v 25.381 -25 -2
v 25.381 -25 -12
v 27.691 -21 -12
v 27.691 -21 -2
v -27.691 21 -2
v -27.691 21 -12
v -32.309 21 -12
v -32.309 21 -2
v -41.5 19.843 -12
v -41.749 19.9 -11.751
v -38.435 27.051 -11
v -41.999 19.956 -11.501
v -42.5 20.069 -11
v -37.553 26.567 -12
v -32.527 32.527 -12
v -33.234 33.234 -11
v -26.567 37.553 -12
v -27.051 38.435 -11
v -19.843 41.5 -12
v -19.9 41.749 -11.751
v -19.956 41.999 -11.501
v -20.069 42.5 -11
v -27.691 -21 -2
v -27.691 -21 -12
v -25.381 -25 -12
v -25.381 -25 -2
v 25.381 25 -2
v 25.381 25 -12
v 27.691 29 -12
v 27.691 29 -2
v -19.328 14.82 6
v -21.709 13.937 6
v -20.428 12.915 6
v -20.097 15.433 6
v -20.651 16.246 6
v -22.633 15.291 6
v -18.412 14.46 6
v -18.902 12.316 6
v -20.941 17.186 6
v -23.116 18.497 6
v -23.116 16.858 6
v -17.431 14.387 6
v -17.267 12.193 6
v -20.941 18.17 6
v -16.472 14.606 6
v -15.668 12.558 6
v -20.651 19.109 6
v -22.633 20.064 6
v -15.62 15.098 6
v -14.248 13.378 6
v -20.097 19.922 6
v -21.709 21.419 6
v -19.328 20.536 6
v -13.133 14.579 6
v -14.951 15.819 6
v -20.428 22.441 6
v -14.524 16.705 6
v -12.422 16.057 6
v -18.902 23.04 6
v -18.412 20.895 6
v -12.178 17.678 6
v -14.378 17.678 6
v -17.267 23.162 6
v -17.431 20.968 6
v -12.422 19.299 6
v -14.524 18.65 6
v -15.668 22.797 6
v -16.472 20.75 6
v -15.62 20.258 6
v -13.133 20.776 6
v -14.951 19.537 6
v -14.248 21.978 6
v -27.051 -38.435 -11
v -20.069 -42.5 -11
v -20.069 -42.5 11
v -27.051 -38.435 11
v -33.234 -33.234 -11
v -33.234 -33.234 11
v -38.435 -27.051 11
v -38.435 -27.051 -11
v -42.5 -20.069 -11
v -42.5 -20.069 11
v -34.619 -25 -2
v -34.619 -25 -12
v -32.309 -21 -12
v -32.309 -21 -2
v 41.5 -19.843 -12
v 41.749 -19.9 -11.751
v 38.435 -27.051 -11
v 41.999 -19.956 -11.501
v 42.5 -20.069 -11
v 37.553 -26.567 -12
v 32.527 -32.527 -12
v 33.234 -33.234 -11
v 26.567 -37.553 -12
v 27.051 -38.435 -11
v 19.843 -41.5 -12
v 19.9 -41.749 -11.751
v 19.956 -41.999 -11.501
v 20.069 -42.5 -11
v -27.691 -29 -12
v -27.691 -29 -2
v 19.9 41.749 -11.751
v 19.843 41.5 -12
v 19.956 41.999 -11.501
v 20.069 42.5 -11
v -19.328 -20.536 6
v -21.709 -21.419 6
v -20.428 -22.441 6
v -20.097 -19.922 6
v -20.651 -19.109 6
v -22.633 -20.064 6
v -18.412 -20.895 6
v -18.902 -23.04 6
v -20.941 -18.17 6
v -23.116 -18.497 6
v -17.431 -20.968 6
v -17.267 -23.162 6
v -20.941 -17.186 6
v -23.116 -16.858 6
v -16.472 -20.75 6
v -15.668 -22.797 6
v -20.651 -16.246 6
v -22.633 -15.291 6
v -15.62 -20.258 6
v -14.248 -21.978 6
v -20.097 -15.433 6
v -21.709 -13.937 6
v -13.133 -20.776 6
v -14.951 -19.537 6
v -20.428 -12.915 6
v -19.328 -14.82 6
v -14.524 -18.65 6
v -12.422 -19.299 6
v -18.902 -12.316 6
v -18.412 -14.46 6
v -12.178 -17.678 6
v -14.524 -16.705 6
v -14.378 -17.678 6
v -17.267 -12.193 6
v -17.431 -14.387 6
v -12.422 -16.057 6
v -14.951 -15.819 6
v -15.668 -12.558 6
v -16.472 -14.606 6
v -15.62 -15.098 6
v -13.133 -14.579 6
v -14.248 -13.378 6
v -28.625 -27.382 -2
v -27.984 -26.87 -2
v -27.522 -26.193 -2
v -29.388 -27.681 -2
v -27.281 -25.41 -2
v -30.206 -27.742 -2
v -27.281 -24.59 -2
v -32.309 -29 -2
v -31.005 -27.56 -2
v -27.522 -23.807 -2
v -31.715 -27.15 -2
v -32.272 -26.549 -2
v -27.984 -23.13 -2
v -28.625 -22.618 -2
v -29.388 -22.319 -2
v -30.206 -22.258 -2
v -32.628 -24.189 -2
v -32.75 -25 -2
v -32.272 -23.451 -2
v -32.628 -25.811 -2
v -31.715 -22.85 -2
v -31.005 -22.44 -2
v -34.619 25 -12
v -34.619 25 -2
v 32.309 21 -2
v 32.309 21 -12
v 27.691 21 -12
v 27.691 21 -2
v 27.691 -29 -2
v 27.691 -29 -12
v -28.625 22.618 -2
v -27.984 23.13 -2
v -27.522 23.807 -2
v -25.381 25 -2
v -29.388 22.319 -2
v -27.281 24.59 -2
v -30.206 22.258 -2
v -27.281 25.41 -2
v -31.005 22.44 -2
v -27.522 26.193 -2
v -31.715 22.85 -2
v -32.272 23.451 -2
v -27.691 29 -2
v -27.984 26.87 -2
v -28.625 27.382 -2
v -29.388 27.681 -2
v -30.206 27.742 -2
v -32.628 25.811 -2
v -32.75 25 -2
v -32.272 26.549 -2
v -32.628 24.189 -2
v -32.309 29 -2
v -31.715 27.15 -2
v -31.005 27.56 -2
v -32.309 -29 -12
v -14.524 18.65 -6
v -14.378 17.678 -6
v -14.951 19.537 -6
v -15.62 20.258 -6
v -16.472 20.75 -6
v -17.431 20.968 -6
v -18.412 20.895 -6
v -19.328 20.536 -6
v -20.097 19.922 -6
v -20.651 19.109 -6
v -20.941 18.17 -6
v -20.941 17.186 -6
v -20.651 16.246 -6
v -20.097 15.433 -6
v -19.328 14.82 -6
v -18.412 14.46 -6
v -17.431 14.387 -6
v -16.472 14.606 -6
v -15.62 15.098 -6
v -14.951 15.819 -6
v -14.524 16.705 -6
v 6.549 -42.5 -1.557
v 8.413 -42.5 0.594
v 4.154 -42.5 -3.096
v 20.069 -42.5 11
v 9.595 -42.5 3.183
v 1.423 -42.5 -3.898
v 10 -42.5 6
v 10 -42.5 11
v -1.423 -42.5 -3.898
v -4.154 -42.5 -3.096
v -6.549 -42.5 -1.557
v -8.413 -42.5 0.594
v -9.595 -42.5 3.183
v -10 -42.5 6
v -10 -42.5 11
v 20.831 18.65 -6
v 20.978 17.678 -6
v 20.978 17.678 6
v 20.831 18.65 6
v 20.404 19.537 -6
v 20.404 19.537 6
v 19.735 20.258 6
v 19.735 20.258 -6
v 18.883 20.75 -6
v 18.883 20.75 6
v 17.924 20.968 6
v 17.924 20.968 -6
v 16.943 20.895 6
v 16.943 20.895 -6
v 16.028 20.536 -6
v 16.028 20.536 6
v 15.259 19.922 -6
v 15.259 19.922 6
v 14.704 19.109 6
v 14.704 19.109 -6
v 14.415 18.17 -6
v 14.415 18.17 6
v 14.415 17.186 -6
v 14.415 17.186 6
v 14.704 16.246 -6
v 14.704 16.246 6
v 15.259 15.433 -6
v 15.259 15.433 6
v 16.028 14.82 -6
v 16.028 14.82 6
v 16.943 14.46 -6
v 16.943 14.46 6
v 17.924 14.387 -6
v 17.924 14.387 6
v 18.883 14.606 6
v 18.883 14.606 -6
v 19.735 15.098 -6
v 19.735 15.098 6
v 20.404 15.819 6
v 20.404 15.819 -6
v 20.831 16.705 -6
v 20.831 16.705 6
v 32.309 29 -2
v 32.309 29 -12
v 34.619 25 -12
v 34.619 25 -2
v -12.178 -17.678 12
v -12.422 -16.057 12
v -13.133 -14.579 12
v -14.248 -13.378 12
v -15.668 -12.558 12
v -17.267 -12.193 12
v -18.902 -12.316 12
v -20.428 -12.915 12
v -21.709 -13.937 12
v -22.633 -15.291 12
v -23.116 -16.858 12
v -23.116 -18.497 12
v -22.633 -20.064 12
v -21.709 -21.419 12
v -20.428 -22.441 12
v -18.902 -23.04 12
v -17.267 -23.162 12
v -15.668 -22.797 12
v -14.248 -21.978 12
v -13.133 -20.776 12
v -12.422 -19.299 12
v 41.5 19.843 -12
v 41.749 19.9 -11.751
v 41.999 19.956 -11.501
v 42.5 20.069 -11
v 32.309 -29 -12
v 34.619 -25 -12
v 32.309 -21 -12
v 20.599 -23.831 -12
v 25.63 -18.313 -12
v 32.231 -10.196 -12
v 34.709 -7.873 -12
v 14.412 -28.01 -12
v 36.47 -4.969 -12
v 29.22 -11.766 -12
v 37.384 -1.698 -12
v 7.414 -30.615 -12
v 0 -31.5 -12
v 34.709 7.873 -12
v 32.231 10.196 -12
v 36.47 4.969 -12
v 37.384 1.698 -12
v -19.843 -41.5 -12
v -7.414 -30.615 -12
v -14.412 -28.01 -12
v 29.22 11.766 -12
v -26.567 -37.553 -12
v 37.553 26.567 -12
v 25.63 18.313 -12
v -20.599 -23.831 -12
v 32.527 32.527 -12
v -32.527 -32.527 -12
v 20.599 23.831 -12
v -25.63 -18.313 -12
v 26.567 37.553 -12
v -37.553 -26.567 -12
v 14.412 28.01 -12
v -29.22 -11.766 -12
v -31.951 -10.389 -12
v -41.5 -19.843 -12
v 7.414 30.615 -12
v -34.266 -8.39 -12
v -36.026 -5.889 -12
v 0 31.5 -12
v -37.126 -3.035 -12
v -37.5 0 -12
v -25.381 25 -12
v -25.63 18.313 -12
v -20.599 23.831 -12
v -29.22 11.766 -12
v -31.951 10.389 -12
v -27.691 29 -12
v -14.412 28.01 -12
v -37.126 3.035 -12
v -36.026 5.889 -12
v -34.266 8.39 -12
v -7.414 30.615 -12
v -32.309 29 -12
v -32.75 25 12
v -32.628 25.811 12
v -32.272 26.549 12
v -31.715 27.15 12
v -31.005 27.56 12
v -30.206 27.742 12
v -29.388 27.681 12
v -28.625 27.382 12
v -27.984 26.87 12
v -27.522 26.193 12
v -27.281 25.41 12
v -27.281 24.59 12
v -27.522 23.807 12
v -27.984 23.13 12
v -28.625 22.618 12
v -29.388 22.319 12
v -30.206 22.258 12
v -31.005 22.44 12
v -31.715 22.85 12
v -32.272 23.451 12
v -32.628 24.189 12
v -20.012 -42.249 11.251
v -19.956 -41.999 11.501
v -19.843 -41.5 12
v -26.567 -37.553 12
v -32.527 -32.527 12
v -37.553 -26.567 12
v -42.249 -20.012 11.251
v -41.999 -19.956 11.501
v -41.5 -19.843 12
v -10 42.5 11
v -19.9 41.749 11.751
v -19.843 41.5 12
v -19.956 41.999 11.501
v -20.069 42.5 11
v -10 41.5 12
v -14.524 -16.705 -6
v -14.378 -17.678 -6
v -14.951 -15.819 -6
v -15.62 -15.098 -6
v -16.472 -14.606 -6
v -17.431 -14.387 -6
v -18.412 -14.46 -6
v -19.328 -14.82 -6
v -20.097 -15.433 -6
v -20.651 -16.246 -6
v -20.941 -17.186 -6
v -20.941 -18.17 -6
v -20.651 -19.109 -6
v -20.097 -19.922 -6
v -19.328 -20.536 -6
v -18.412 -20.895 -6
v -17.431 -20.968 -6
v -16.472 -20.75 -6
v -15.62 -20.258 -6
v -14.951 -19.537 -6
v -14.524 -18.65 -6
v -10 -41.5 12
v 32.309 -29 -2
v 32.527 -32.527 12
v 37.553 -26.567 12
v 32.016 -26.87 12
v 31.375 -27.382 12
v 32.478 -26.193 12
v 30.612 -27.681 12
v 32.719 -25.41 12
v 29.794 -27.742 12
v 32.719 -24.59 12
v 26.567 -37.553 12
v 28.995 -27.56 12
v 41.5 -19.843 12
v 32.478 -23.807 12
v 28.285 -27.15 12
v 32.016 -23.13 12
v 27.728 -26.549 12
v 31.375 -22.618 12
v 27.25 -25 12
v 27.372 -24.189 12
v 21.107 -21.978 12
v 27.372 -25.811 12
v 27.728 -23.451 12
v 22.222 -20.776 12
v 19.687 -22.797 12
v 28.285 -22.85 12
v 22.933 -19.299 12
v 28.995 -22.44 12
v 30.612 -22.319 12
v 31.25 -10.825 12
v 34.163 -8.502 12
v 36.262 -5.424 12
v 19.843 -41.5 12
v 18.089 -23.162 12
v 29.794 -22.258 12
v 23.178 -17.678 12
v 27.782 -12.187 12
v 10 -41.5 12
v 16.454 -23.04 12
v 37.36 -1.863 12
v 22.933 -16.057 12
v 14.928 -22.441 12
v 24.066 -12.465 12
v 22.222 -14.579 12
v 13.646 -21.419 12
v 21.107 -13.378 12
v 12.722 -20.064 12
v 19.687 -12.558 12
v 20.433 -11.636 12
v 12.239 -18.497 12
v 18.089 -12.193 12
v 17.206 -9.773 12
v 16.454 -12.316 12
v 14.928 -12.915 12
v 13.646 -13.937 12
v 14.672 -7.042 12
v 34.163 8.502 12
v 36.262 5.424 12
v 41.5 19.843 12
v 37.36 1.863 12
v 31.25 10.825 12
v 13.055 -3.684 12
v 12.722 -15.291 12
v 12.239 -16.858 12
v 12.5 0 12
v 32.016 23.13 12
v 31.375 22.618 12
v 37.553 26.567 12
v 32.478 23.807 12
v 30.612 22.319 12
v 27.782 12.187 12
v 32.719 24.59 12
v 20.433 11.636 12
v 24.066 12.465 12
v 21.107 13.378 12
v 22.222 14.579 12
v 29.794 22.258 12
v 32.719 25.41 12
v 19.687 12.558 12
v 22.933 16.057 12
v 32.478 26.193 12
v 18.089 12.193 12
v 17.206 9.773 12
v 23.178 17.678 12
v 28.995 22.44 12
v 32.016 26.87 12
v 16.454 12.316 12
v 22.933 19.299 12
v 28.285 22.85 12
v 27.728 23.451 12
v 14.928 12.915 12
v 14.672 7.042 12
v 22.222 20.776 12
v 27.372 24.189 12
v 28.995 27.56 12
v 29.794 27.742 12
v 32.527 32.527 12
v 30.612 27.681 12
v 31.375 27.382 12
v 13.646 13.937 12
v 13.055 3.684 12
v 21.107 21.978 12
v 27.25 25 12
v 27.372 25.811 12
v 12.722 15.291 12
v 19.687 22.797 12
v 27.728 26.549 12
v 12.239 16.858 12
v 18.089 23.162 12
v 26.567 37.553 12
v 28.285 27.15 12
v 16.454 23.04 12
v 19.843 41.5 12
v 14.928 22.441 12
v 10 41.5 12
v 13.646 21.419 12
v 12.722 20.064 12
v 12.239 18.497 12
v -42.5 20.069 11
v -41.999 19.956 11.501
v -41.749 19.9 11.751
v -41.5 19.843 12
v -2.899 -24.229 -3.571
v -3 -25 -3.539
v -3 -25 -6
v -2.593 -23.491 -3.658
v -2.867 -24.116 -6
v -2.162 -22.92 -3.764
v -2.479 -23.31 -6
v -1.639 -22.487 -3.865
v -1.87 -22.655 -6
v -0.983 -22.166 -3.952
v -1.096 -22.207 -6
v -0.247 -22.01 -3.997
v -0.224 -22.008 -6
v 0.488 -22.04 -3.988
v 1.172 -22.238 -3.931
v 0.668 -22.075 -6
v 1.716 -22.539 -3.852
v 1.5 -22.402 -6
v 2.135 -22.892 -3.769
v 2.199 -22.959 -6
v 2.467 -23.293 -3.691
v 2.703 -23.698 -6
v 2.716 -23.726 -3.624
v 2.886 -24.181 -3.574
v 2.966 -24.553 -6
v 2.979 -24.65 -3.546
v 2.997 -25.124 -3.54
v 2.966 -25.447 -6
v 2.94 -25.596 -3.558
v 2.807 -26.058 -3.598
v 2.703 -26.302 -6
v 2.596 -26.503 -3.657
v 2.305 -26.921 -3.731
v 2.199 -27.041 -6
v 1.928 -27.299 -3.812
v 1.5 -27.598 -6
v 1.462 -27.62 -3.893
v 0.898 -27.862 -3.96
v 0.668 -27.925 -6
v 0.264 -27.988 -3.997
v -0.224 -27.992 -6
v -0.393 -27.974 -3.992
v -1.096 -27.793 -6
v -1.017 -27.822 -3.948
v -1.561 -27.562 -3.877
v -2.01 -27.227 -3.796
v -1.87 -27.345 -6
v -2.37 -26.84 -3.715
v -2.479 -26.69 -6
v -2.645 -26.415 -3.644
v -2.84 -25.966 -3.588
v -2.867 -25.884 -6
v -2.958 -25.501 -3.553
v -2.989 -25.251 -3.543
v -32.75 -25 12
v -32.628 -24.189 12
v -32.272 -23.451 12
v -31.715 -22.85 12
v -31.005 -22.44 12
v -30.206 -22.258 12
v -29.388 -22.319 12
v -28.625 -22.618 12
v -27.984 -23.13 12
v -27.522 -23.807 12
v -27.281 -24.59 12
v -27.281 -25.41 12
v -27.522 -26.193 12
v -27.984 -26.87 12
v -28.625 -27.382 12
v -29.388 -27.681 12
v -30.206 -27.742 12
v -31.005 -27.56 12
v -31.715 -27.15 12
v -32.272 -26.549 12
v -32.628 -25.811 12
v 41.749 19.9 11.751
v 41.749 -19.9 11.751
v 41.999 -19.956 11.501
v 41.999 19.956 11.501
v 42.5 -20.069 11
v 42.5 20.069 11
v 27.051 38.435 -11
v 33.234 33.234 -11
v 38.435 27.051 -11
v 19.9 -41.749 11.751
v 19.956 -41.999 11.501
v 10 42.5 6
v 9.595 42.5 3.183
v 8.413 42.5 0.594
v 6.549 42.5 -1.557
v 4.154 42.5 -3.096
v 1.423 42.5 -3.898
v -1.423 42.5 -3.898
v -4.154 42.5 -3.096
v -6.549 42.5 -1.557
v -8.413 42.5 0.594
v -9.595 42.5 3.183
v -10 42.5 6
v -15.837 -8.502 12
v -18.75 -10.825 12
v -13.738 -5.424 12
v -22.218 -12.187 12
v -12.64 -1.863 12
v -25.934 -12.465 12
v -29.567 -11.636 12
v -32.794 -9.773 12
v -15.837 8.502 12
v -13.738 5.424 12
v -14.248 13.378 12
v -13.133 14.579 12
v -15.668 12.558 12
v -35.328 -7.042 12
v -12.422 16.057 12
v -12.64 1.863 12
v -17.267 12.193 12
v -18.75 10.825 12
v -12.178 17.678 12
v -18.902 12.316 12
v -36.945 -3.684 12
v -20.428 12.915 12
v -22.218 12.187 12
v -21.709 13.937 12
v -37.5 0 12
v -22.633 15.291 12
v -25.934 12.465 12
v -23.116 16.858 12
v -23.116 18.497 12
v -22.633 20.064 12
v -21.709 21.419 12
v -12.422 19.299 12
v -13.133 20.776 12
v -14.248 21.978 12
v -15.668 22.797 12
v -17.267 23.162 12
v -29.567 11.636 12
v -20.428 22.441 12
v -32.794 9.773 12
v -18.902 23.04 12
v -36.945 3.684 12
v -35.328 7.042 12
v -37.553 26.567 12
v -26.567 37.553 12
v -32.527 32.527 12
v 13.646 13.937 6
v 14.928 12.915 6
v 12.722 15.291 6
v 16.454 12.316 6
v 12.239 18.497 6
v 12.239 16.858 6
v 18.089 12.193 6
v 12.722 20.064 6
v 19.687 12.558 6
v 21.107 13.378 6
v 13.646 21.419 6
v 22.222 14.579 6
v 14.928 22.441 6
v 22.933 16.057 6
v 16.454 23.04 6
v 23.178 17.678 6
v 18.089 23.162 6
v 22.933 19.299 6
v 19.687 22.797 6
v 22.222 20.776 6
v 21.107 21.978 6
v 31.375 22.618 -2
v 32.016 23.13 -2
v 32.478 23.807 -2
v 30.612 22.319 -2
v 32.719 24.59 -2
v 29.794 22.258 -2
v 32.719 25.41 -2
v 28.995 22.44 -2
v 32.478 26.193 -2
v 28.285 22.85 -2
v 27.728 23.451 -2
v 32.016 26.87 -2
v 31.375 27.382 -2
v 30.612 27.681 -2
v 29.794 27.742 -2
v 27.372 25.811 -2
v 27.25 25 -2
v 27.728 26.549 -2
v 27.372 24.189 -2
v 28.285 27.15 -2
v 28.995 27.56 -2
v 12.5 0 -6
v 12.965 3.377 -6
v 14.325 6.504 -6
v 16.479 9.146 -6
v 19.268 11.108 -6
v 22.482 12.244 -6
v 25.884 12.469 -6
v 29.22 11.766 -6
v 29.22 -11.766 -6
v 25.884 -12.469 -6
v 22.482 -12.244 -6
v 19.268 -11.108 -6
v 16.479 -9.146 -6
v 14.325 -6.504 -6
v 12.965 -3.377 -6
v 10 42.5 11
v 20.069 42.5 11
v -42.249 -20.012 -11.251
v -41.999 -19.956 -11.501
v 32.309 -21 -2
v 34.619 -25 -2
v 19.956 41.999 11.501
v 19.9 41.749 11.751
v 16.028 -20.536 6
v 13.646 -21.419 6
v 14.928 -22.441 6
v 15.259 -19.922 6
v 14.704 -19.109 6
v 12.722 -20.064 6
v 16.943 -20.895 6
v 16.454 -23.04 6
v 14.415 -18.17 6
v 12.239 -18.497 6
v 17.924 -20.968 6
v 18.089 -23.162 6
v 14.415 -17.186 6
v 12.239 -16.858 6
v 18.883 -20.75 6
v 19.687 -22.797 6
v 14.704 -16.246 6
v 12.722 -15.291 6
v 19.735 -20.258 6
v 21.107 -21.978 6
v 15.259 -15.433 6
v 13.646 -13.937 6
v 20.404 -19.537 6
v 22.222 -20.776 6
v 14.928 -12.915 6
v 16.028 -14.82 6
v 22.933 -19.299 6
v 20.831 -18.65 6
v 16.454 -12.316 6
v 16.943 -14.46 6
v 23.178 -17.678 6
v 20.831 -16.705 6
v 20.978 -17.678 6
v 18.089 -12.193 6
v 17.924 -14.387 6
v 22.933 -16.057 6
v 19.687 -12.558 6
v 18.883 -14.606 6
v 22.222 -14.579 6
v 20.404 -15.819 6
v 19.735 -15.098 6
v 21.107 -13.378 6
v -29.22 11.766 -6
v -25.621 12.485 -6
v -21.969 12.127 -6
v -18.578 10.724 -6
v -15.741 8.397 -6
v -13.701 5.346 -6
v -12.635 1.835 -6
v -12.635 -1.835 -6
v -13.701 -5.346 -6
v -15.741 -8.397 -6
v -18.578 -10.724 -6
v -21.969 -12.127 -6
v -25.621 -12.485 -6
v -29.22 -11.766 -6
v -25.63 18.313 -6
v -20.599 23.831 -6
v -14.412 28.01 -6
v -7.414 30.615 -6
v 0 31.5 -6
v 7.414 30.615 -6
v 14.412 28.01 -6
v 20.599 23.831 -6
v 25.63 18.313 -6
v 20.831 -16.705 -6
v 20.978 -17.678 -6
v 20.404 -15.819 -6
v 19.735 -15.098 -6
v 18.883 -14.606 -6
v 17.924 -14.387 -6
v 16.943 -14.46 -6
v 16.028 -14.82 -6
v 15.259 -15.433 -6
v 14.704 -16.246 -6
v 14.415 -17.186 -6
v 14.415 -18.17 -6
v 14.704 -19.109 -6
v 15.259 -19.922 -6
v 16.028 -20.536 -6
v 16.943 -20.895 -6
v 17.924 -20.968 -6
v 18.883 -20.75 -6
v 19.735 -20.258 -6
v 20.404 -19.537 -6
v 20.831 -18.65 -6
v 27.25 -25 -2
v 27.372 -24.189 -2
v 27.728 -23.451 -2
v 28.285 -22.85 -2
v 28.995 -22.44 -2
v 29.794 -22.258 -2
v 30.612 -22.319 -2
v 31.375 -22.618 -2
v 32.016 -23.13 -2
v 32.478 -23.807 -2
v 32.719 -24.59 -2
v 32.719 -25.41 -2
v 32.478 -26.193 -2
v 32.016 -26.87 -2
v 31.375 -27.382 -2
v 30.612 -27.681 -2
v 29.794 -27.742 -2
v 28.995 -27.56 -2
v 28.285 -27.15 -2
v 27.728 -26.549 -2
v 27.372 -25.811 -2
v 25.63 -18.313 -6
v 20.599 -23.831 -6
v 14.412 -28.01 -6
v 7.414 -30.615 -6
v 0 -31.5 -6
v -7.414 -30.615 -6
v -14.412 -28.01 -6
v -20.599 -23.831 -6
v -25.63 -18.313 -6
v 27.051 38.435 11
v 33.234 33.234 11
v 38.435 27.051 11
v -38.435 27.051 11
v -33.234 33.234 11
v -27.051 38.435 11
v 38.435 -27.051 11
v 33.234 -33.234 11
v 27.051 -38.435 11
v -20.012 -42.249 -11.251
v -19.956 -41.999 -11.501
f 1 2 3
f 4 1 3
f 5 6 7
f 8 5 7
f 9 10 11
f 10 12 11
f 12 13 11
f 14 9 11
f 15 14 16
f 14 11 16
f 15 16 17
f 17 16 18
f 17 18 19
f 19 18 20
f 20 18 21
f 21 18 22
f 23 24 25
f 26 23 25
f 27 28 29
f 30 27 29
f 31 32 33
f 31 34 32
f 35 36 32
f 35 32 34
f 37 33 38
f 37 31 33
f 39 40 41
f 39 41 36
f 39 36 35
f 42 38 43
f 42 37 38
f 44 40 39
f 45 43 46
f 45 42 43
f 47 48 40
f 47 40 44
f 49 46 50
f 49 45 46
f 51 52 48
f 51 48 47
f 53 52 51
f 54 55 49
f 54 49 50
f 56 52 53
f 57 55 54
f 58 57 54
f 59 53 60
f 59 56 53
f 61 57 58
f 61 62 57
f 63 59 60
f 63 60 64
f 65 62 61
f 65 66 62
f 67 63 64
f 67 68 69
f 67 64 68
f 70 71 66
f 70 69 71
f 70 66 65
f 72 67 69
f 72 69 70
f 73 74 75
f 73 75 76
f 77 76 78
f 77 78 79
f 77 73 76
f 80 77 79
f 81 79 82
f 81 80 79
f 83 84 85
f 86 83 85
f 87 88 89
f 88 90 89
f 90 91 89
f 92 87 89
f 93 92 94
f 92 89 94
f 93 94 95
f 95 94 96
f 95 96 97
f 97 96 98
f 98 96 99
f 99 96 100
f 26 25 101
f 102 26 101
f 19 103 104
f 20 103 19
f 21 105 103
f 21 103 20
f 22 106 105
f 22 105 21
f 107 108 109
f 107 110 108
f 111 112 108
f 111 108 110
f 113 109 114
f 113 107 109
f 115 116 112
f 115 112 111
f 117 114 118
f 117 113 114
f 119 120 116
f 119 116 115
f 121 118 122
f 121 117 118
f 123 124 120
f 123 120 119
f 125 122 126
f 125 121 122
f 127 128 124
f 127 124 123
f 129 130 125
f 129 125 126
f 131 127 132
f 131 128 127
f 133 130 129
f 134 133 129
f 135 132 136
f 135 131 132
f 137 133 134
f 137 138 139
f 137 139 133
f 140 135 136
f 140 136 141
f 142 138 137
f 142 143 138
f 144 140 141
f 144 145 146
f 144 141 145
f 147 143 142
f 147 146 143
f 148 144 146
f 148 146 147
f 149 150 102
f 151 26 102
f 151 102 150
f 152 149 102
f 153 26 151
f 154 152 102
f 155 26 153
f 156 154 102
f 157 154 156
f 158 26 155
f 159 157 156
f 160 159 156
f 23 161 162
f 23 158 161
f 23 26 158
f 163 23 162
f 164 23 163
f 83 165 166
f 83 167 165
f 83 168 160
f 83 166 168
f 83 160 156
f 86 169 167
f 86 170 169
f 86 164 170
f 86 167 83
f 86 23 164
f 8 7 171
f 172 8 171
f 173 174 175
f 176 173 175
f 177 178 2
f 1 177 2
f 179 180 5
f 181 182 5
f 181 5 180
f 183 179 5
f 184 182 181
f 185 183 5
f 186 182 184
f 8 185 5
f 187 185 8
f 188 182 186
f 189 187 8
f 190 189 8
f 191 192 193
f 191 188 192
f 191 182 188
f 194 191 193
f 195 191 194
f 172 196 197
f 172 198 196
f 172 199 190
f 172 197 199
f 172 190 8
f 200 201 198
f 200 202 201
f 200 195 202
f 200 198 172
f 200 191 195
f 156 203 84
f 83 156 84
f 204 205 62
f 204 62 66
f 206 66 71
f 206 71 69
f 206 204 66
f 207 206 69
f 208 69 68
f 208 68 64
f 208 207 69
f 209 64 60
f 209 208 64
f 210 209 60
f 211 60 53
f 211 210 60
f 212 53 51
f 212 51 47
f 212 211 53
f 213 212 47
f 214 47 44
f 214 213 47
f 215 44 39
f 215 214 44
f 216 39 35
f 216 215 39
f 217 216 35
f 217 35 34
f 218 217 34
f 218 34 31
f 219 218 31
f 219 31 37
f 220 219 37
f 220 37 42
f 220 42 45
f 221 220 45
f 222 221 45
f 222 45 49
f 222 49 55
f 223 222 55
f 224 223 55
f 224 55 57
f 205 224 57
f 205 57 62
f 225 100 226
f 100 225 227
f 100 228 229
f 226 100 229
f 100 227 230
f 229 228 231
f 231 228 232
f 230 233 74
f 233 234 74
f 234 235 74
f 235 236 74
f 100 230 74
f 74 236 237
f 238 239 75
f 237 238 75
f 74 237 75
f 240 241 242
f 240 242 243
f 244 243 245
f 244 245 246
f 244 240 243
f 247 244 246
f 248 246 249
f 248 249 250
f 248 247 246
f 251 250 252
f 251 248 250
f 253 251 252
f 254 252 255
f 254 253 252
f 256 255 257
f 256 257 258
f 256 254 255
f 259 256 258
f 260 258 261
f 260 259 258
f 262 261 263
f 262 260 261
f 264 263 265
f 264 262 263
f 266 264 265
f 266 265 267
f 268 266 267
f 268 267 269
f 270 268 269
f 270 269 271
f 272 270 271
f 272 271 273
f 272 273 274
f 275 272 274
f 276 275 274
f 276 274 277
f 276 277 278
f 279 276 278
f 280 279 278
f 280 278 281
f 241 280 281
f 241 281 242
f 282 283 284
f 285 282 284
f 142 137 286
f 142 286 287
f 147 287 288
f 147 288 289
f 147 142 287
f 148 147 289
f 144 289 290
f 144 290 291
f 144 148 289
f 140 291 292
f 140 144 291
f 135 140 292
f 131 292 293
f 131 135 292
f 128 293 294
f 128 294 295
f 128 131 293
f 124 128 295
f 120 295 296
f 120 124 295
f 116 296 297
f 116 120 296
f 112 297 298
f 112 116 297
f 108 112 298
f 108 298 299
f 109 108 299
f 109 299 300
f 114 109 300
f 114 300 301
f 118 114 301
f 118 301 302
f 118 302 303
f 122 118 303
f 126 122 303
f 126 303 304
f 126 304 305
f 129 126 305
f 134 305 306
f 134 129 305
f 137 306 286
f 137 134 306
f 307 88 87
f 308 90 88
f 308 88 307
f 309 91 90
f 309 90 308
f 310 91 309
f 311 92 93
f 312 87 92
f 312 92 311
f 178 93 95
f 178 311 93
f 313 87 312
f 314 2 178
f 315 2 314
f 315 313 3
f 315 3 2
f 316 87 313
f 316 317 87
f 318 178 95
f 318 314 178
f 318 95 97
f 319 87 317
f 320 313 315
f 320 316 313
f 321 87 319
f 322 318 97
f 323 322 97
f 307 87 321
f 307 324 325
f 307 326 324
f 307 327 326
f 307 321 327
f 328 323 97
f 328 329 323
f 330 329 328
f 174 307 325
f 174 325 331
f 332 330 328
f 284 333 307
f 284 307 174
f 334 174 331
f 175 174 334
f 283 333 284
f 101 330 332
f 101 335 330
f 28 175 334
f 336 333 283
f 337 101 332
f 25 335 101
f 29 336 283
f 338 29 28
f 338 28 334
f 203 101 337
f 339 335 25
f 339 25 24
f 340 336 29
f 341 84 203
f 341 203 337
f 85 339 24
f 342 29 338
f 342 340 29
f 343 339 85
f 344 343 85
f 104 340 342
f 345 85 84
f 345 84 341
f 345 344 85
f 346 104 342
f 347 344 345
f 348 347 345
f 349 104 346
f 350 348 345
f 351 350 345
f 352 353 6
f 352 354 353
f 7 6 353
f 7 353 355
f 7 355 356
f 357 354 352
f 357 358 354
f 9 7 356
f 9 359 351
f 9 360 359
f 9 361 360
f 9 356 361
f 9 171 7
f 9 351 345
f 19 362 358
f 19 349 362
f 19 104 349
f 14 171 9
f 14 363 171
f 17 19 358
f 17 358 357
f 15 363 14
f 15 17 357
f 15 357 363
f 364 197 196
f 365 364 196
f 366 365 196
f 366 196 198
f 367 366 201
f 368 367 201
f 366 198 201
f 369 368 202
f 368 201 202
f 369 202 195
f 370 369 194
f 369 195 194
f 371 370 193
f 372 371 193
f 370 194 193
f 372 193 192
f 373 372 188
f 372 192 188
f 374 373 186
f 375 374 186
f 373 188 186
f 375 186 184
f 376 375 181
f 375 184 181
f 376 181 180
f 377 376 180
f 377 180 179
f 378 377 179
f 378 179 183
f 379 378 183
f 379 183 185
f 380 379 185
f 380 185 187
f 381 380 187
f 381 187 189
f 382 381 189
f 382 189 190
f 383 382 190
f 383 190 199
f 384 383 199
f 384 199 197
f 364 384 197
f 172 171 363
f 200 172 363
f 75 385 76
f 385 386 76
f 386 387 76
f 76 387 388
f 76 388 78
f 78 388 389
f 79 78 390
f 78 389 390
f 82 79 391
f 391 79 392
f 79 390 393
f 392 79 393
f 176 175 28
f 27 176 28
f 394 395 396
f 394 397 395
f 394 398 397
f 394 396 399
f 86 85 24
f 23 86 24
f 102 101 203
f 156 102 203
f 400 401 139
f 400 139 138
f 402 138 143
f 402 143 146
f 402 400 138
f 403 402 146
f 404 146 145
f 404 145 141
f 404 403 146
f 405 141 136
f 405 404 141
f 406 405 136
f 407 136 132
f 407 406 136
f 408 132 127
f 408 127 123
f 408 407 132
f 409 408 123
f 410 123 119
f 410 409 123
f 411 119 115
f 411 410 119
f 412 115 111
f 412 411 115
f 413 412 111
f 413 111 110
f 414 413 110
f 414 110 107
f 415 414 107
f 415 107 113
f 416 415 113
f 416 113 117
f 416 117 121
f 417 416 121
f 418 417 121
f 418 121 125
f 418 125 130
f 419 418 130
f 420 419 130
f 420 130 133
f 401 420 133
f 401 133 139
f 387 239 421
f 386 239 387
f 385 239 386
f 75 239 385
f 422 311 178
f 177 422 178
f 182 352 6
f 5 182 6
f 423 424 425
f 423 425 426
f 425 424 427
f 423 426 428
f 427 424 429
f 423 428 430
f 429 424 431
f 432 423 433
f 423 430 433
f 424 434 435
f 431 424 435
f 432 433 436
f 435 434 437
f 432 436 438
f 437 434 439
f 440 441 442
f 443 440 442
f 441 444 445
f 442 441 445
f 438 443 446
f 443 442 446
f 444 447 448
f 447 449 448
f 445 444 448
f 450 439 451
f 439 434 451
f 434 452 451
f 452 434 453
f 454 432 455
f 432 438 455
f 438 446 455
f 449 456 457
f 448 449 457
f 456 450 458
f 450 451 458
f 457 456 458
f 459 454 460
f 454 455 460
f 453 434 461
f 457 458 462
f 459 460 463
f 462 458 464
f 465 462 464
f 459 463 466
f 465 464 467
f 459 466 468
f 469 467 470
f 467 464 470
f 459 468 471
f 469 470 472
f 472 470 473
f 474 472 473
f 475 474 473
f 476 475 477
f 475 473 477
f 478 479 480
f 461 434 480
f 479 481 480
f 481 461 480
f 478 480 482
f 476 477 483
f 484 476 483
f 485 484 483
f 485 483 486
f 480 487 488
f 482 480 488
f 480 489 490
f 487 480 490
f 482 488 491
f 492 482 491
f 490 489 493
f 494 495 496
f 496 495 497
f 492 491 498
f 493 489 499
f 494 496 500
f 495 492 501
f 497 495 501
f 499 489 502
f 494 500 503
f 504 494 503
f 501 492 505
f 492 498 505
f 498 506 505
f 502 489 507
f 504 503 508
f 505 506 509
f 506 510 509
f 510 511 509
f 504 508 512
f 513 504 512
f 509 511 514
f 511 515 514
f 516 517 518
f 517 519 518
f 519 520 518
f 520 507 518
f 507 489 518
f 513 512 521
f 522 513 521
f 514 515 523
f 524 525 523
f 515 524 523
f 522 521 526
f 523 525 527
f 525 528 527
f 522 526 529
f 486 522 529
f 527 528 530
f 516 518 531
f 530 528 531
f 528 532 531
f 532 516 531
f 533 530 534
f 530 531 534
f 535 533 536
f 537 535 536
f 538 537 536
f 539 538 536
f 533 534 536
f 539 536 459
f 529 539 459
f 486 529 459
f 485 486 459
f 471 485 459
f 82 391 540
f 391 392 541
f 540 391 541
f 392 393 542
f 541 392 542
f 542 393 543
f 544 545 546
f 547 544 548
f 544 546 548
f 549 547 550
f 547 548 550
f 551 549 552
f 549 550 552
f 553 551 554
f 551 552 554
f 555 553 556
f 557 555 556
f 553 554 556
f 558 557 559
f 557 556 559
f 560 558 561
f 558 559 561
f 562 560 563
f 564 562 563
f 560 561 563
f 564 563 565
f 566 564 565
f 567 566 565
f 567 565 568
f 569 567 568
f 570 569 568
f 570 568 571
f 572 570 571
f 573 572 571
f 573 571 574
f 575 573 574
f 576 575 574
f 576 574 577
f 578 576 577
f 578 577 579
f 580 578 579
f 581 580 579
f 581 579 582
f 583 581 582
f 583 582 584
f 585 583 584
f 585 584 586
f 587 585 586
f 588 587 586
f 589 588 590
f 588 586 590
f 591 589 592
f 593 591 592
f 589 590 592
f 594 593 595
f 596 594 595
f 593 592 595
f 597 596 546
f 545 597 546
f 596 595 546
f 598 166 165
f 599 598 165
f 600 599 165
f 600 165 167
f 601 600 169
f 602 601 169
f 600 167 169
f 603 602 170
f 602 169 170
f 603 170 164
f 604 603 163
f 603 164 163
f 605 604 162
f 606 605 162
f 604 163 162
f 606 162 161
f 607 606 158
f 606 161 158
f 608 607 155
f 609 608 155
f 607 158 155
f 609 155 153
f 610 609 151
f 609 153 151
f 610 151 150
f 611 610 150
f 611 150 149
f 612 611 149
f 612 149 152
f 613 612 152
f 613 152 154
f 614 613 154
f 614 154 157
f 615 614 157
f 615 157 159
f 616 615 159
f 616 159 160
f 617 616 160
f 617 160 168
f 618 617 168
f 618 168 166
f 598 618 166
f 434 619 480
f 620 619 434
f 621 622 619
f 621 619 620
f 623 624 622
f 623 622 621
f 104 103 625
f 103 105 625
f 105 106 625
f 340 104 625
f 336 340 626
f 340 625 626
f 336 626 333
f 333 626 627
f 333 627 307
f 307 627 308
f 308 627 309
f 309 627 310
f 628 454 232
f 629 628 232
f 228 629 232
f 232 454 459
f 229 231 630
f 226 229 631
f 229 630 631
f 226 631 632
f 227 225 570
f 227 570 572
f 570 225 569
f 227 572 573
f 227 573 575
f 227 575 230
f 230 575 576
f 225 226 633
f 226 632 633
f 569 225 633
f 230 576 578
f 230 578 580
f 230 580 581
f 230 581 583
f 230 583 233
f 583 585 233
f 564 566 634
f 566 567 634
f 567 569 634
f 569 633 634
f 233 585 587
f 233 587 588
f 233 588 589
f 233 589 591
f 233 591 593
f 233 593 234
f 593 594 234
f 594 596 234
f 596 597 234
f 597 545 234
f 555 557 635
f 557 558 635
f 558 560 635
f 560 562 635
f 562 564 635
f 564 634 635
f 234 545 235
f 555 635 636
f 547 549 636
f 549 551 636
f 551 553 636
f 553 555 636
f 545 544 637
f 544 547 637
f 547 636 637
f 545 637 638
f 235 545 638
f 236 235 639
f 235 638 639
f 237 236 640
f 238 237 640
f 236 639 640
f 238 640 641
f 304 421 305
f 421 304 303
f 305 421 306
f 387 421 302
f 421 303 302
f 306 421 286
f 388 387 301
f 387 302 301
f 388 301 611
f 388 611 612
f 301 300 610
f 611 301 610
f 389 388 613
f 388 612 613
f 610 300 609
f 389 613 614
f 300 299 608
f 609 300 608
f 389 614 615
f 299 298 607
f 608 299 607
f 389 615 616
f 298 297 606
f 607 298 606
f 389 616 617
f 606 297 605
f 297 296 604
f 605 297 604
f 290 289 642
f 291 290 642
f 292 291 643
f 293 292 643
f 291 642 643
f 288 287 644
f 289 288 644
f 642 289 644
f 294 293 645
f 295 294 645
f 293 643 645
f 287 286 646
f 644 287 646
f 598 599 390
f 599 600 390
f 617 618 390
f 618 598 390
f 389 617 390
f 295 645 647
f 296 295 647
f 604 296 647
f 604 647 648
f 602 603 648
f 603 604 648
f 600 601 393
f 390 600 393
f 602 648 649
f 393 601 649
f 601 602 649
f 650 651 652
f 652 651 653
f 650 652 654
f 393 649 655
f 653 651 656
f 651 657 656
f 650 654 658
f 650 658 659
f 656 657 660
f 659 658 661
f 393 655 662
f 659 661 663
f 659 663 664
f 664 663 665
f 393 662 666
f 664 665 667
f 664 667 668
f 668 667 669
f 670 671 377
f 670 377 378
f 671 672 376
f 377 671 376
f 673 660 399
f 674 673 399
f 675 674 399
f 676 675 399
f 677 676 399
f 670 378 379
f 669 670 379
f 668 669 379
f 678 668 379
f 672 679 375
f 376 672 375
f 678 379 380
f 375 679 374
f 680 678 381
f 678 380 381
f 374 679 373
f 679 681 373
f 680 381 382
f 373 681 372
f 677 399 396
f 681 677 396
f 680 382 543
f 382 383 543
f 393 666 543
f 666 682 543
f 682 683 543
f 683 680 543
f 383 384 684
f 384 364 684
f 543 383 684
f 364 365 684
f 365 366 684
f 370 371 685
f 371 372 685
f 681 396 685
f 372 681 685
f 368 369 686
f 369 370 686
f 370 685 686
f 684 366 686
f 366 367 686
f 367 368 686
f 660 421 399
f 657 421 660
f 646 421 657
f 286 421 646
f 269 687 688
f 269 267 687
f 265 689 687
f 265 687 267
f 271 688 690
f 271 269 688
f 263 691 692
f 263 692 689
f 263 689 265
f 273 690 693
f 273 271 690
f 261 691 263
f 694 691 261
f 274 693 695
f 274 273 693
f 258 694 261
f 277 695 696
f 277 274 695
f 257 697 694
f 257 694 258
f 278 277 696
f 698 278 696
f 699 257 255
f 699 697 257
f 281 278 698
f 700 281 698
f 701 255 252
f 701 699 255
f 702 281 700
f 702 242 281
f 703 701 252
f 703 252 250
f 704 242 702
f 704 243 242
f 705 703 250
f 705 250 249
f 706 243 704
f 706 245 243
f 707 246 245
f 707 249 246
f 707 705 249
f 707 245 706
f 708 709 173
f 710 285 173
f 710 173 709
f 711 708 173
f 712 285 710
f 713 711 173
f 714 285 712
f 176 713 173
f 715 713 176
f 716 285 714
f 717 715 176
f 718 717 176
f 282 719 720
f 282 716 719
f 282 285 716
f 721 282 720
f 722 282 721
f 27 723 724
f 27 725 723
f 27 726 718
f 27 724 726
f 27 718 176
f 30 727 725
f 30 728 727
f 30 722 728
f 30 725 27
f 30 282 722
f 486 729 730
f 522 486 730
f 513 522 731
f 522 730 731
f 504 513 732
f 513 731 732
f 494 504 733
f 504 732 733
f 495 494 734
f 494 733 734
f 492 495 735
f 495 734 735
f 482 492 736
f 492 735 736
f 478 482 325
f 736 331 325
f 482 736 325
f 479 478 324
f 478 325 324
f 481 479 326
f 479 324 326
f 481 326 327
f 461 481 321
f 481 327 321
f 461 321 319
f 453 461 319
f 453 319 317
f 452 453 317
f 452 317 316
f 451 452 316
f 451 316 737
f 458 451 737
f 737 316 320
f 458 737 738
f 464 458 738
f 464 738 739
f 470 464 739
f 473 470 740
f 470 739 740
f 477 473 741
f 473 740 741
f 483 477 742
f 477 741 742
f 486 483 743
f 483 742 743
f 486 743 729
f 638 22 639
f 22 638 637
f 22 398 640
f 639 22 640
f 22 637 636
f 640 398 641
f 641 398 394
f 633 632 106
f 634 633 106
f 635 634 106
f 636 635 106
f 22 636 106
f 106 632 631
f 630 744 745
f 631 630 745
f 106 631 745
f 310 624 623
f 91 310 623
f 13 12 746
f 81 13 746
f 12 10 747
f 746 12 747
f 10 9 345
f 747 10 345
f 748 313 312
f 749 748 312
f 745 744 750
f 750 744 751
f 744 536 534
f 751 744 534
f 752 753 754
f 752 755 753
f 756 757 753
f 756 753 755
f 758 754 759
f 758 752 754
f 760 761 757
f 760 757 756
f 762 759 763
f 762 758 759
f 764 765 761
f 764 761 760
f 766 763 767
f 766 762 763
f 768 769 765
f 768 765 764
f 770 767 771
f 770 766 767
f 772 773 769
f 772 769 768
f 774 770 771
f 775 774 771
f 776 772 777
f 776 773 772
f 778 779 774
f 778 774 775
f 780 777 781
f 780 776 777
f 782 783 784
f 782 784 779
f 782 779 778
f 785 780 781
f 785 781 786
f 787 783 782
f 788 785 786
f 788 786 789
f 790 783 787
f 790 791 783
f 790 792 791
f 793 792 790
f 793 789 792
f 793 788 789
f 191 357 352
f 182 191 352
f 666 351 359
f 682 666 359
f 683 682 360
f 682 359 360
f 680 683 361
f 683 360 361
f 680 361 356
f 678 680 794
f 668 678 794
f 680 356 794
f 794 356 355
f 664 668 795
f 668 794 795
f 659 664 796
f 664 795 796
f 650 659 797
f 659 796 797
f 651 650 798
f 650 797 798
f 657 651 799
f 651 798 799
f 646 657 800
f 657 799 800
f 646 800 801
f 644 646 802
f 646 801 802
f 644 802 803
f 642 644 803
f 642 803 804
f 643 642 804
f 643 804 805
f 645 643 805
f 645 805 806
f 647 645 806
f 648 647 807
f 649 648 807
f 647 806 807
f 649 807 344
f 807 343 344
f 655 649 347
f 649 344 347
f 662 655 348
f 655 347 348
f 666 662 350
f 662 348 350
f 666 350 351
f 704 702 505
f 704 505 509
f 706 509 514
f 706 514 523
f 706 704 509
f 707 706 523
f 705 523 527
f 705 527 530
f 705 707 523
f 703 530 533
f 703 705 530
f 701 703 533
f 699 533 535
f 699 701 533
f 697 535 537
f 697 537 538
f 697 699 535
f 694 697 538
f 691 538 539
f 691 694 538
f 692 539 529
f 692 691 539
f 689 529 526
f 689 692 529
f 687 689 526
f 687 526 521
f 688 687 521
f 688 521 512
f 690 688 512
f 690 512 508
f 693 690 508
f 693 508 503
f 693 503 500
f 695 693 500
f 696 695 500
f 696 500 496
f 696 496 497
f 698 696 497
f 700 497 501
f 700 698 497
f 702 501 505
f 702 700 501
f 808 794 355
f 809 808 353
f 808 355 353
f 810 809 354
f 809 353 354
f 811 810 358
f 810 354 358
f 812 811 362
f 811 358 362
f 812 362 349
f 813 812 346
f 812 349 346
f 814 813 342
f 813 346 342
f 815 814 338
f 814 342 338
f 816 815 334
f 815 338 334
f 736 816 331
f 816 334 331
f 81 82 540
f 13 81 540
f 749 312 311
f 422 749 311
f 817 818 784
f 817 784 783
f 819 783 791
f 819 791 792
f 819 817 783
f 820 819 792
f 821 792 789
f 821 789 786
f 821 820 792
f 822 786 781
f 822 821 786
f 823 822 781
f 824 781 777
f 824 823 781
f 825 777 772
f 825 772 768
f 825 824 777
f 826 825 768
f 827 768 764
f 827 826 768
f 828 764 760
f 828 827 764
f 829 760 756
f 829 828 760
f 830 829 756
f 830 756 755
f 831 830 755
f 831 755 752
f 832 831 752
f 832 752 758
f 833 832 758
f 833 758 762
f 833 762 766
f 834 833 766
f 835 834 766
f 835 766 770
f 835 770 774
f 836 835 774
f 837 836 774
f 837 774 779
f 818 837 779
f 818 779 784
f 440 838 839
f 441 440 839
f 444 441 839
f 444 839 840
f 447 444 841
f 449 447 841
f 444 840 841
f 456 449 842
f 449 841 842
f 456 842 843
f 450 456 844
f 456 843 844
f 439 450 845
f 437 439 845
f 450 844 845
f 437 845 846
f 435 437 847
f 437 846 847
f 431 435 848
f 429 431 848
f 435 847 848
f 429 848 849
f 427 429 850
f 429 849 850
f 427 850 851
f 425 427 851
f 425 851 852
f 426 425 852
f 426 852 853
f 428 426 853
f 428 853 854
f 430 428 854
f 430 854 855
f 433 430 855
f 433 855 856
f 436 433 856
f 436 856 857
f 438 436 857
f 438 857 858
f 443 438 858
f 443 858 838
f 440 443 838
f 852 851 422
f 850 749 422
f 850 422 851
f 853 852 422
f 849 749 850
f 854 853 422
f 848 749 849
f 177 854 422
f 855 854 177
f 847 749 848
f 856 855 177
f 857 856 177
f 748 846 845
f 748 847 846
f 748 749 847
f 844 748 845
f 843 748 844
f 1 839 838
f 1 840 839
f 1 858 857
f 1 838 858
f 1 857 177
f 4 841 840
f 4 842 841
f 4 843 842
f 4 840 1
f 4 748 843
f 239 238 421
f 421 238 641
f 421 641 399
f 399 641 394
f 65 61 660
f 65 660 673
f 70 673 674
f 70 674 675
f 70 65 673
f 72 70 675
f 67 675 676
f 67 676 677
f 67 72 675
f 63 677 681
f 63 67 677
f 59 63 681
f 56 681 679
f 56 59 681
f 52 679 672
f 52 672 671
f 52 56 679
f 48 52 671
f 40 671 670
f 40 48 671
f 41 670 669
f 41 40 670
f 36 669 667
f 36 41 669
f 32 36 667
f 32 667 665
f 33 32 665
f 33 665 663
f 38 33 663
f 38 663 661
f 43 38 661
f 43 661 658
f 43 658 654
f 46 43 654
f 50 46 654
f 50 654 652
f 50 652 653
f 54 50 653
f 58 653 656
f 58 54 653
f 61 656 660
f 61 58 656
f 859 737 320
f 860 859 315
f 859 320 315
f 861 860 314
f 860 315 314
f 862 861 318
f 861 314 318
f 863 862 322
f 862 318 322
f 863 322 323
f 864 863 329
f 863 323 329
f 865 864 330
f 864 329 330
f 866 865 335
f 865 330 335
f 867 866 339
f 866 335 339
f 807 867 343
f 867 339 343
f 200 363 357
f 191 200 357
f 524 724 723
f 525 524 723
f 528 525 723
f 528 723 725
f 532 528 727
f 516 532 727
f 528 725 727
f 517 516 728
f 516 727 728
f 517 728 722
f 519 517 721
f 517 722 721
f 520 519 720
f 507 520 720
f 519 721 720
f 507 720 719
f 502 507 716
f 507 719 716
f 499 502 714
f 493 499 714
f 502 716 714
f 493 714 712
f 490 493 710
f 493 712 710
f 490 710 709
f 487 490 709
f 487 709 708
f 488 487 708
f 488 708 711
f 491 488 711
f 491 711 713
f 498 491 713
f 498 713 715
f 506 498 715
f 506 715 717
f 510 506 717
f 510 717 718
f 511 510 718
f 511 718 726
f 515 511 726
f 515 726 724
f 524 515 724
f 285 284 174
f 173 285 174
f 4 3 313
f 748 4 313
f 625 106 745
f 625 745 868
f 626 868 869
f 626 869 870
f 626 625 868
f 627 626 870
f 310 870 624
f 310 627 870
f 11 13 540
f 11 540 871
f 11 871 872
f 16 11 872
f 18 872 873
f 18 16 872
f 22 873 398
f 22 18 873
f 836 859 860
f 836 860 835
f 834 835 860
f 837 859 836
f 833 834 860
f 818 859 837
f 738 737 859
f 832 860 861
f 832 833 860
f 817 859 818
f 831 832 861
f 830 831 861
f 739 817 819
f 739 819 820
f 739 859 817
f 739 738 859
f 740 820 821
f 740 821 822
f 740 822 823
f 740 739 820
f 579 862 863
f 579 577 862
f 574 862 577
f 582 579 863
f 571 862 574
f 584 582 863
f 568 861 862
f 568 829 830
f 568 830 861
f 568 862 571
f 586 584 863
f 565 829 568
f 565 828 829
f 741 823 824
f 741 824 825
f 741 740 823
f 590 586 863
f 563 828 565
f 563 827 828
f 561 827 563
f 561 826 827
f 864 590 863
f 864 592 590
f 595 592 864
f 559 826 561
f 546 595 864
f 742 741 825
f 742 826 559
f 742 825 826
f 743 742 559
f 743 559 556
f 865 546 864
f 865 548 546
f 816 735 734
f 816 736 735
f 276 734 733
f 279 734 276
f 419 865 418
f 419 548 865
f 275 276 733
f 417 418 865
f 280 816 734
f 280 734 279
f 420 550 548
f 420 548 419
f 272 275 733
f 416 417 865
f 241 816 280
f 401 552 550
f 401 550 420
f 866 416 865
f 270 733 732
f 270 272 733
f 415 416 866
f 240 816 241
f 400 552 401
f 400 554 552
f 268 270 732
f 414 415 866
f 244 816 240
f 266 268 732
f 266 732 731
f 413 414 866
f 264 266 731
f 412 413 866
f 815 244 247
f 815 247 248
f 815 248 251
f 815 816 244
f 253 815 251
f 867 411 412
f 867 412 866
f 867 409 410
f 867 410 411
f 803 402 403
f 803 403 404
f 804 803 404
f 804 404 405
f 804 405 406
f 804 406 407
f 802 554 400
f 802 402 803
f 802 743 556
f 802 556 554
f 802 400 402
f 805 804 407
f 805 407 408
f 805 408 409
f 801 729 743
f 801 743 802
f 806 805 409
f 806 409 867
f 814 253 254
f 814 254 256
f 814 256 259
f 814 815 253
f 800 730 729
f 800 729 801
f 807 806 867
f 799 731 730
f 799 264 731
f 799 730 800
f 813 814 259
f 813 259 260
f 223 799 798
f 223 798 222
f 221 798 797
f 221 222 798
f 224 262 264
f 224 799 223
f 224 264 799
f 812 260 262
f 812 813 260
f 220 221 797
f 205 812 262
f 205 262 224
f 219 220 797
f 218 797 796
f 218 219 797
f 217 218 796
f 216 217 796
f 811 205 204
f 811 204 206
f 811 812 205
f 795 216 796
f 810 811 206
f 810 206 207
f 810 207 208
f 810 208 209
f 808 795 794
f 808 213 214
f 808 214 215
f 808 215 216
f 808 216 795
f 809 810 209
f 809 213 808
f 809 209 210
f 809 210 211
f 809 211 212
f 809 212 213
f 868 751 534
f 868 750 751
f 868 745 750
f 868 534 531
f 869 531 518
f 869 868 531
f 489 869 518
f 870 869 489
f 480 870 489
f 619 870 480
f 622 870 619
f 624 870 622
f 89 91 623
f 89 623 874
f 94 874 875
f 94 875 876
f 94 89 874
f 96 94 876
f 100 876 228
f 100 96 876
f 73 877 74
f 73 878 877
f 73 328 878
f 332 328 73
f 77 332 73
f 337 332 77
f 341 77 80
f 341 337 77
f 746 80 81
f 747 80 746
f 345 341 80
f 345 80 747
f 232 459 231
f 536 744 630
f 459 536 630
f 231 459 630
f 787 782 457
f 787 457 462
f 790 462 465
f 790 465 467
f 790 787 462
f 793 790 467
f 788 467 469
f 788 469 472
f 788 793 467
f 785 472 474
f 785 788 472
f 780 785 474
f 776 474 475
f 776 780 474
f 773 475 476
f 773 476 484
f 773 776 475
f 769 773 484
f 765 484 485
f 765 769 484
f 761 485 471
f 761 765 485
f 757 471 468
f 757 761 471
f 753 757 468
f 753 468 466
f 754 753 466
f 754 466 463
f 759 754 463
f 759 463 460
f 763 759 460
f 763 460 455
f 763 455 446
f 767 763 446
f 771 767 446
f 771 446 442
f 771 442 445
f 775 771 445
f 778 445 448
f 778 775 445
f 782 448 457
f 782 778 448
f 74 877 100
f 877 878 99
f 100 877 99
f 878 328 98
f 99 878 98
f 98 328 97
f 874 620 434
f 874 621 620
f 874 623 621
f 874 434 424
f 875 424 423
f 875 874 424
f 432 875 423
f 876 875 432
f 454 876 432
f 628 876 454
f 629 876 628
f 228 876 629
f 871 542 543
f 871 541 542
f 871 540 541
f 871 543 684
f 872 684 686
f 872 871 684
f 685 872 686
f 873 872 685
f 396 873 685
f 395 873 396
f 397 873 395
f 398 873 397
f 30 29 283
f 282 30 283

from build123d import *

# Parameters (mm, degrees)
SKETCH1_W                        = 70
SKETCH1_H                        = 50
BOSS_EXTRUDE1_DEPTH              = 12
SKETCH4_R                        = 47
BOSS_EXTRUDE2_DEPTH              = 24
SKETCH2_R                        = 31.5
CUT_EXTRUDE1_DEPTH               = 6
CBORE_START                      = -6
CBORE_FOR_M6_SHCS1_OUTLINE_R     = 3.3
CBORE_FOR_M6_SHCS1_DEPTH         = 18
CBORE_START_2                    = 6
CBORE_FOR_M6_SHCS1_2_OUTLINE_R   = 5.5
CBORE_FOR_M6_SHCS1_2_OUTLINE_R_2 = 3.3
CBORE_FOR_M6_SHCS1_2_DEPTH       = 6
CUT_EXTRUDE6_DEPTH               = 68.542579163
CUT_EXTRUDE6_DEPTH_BACK          = 68.542579163
M5_CLEARANCE_HOLE2_D             = 5.5
F_6_0MM_PRESS_DOWEL_HOLE2_D      = 6
SKETCH22_R                       = 12.5
CUT_EXTRUDE7_DEPTH               = 71.668239144
CUT_EXTRUDE8_DEPTH               = 10
CUT_EXTRUDE9_DEPTH               = 71.668239144
CHAMFER2_SIZE                    = 1


# Read off the part's stored shape, not the designer's step: CBORE for M6 SHCS1
with BuildPart() as part:
    # Sketch1 → Boss-Extrude1 (new, symmetric)
    with BuildSketch(Plane.XY):
        Rectangle(SKETCH1_W, SKETCH1_H)
    extrude(amount=BOSS_EXTRUDE1_DEPTH, both=True)

    # Sketch4 → Boss-Extrude2 (add, through all)
    with BuildSketch(Plane(origin=(0, 0, -12), x_dir=(-1, 0, 0), z_dir=(0, 0, -1))):
        Circle(SKETCH4_R)
    extrude(amount=-BOSS_EXTRUDE2_DEPTH)

    # Sketch2 → Cut-Extrude1 (cut)
    with BuildSketch(Plane(origin=(0, 0, -12), x_dir=(-1, 0, 0), z_dir=(0, 0, -1))):
        Circle(SKETCH2_R)
    extrude(amount=-CUT_EXTRUDE1_DEPTH, mode=Mode.SUBTRACT)

    # CBORE for M6 SHCS1 outline → CBORE for M6 SHCS1 (cut)
    with BuildSketch(Plane.XY.offset(CBORE_START)):
        with Locations((-17.67766953, -17.67766953)):
            Circle(CBORE_FOR_M6_SHCS1_OUTLINE_R)
        with Locations((-17.67766953, 17.67766953)):
            Circle(CBORE_FOR_M6_SHCS1_OUTLINE_R)
        with Locations((17.67766953, 17.67766953)):
            Circle(CBORE_FOR_M6_SHCS1_OUTLINE_R)
        with Locations((17.67766953, -17.67766953)):
            Circle(CBORE_FOR_M6_SHCS1_OUTLINE_R)
    extrude(amount=CBORE_FOR_M6_SHCS1_DEPTH, mode=Mode.SUBTRACT)

    # CBORE for M6 SHCS1 2 outline → CBORE for M6 SHCS1 2 (cut)
    # profile 1 of 4: a face of its own
    with BuildSketch(Plane.XY.offset(CBORE_START_2)):
        with Locations((-17.67766953, -17.67766953)):
            Circle(CBORE_FOR_M6_SHCS1_2_OUTLINE_R)
        with Locations((-17.67766953, -17.67766953)):
            Circle(CBORE_FOR_M6_SHCS1_2_OUTLINE_R_2, mode=Mode.SUBTRACT)
    # profile 2 of 4: a face of its own
    with BuildSketch(Plane.XY.offset(CBORE_START_2)):
        with Locations((-17.67766953, 17.67766953)):
            Circle(CBORE_FOR_M6_SHCS1_2_OUTLINE_R)
        with Locations((-17.67766953, 17.67766953)):
            Circle(CBORE_FOR_M6_SHCS1_2_OUTLINE_R_2, mode=Mode.SUBTRACT)
    # profile 3 of 4: a face of its own
    with BuildSketch(Plane.XY.offset(CBORE_START_2)):
        with Locations((17.67766953, 17.67766953)):
            Circle(CBORE_FOR_M6_SHCS1_2_OUTLINE_R)
        with Locations((17.67766953, 17.67766953)):
            Circle(CBORE_FOR_M6_SHCS1_2_OUTLINE_R_2, mode=Mode.SUBTRACT)
    # profile 4 of 4: a face of its own
    with BuildSketch(Plane.XY.offset(CBORE_START_2)):
        with Locations((17.67766953, -17.67766953)):
            Circle(CBORE_FOR_M6_SHCS1_2_OUTLINE_R)
        with Locations((17.67766953, -17.67766953)):
            Circle(CBORE_FOR_M6_SHCS1_2_OUTLINE_R_2, mode=Mode.SUBTRACT)
    extrude(amount=CBORE_FOR_M6_SHCS1_2_DEPTH, mode=Mode.SUBTRACT)

    # Sketch17 → Cut-Extrude6 (cut, two sides: drawn at the far end of the back side and taken through both)
    with BuildSketch(Plane.XZ.offset(-CUT_EXTRUDE6_DEPTH_BACK)):
        with BuildLine():
            Line((10, 16), (10, 6))
            ThreePointArc((10, 6), (0, -4), (-10, 6))
            Line((-10, 6), (-10, 16))
            ThreePointArc((-10, 16), (0, 26), (10, 16))
        make_face()
    extrude(amount=CUT_EXTRUDE6_DEPTH + CUT_EXTRUDE6_DEPTH_BACK, mode=Mode.SUBTRACT)

    # M5 Clearance Hole2 (through all)
    with Locations(Plane.XY.offset(12)):
        with Locations((-30, 25), (-30, -25), (30, -25), (30, 25)):
            Hole(M5_CLEARANCE_HOLE2_D / 2)

    # Ø6.0mm Press Dowel Hole2 (through all)
    with Locations(Plane.XY.offset(12)):
        with Locations((0, -25)):
            Hole(F_6_0MM_PRESS_DOWEL_HOLE2_D / 2)

    # Sketch22 → Cut-Extrude7 (cut, through all)
    with BuildSketch(Plane(origin=(0, 0, -12), x_dir=(-1, 0, 0), z_dir=(0, 0, -1))):
        with Locations((-25, 0)):
            Circle(SKETCH22_R)
        with Locations((25, 0)):
            Circle(SKETCH22_R)
    extrude(amount=-CUT_EXTRUDE7_DEPTH, mode=Mode.SUBTRACT)

    # Sketch23 → Cut-Extrude8 (cut)
    with BuildSketch(Plane(origin=(0, 0, -12), x_dir=(-1, 0, 0), z_dir=(0, 0, -1))):
        Polygon((-27.690598923, 29), (-32.309401077, 29), (-34.618802154, 25), (-32.309401077, 21), (-27.690598923, 21), (-25.381197846, 25), align=None)
        Polygon((-32.309401077, -21), (-34.618802154, -25), (-32.309401077, -29), (-27.690598923, -29), (-25.381197846, -25), (-27.690598923, -21), align=None)
        Polygon((32.309401077, -21), (27.690598923, -21), (25.381197846, -25), (27.690598923, -29), (32.309401077, -29), (34.618802154, -25), align=None)
        Polygon((27.690598923, 29), (25.381197846, 25), (27.690598923, 21), (32.309401077, 21), (34.618802154, 25), (32.309401077, 29), align=None)
    extrude(amount=-CUT_EXTRUDE8_DEPTH, mode=Mode.SUBTRACT)

    # Sketch24 → Cut-Extrude9 (cut, through all)
    with BuildSketch(Plane.XY.offset(12)):
        with BuildLine():
            ThreePointArc((-20.06863224, -42.5), (-15.131468813, -44.497625235), (-10, -45.923850013))
            Line((-10, -45.923850013), (-10, -42.5))
            Line((-10, -42.5), (-20.06863224, -42.5))
        make_face()
        with BuildLine():
            Line((-10, -42.5), (-10, -45.923850013))
            ThreePointArc((-10, -45.923850013), (0, -47), (10, -45.923850013))
            Line((10, -45.923850013), (10, -42.5))
            Line((10, -42.5), (-10, -42.5))
        make_face()
        with BuildLine():
            Line((10, -42.5), (10, -45.923850013))
            ThreePointArc((10, -45.923850013), (15.131468813, -44.497625235), (20.06863224, -42.5))
            Line((20.06863224, -42.5), (10, -42.5))
        make_face()
        with BuildLine():
            Line((42.5, 20.06863224), (42.5, -20.06863224))
            ThreePointArc((42.5, -20.06863224), (47, 0), (42.5, 20.06863224))
        make_face()
        with BuildLine():
            Line((10, 45.923850013), (10, 42.5))
            Line((10, 42.5), (20.06863224, 42.5))
            ThreePointArc((20.06863224, 42.5), (15.131468813, 44.497625235), (10, 45.923850013))
        make_face()
        with BuildLine():
            Line((-10, 45.923850013), (-10, 42.5))
            Line((-10, 42.5), (10, 42.5))
            Line((10, 42.5), (10, 45.923850013))
            ThreePointArc((10, 45.923850013), (0, 47), (-10, 45.923850013))
        make_face()
        with BuildLine():
            Line((-20.06863224, 42.5), (-10, 42.5))
            Line((-10, 42.5), (-10, 45.923850013))
            ThreePointArc((-10, 45.923850013), (-15.131468813, 44.497625235), (-20.06863224, 42.5))
        make_face()
        with BuildLine():
            ThreePointArc((-42.5, 20.06863224), (-47, 0), (-42.5, -20.06863224))
            Line((-42.5, -20.06863224), (-42.5, 20.06863224))
        make_face()
    extrude(amount=-CUT_EXTRUDE9_DEPTH, mode=Mode.SUBTRACT)

    # Chamfer2
    chamfer2_edges = [part.edges().sort_by_distance(p)[0] for p in [
        (-33.234018716, 33.234018716, -12),
        (-33.234018716, -33.234018716, 12),
        (-33.234018716, 33.234018716, 12),
        (33.234018716, 33.234018716, -12),
        (33.234018716, -33.234018716, -12),
        (-33.234018716, -33.234018716, -12),
        (33.234018716, 33.234018716, 12),
        (33.234018716, -33.234018716, 12),
        (0, -42.5, -12),
        (15.03431612, -42.5, 12),
        (-15.03431612, -42.5, 12),
        (42.5, 0, 12),
        (42.5, 0, -12),
        (-15.03431612, 42.5, 12),
        (15.03431612, 42.5, 12),
        (0, 42.5, -12),
        (-42.5, 0, -12),
        (-42.5, 0, 12),
    ]]
    chamfer(chamfer2_edges, length=CHAMFER2_SIZE)


solid = part.part
